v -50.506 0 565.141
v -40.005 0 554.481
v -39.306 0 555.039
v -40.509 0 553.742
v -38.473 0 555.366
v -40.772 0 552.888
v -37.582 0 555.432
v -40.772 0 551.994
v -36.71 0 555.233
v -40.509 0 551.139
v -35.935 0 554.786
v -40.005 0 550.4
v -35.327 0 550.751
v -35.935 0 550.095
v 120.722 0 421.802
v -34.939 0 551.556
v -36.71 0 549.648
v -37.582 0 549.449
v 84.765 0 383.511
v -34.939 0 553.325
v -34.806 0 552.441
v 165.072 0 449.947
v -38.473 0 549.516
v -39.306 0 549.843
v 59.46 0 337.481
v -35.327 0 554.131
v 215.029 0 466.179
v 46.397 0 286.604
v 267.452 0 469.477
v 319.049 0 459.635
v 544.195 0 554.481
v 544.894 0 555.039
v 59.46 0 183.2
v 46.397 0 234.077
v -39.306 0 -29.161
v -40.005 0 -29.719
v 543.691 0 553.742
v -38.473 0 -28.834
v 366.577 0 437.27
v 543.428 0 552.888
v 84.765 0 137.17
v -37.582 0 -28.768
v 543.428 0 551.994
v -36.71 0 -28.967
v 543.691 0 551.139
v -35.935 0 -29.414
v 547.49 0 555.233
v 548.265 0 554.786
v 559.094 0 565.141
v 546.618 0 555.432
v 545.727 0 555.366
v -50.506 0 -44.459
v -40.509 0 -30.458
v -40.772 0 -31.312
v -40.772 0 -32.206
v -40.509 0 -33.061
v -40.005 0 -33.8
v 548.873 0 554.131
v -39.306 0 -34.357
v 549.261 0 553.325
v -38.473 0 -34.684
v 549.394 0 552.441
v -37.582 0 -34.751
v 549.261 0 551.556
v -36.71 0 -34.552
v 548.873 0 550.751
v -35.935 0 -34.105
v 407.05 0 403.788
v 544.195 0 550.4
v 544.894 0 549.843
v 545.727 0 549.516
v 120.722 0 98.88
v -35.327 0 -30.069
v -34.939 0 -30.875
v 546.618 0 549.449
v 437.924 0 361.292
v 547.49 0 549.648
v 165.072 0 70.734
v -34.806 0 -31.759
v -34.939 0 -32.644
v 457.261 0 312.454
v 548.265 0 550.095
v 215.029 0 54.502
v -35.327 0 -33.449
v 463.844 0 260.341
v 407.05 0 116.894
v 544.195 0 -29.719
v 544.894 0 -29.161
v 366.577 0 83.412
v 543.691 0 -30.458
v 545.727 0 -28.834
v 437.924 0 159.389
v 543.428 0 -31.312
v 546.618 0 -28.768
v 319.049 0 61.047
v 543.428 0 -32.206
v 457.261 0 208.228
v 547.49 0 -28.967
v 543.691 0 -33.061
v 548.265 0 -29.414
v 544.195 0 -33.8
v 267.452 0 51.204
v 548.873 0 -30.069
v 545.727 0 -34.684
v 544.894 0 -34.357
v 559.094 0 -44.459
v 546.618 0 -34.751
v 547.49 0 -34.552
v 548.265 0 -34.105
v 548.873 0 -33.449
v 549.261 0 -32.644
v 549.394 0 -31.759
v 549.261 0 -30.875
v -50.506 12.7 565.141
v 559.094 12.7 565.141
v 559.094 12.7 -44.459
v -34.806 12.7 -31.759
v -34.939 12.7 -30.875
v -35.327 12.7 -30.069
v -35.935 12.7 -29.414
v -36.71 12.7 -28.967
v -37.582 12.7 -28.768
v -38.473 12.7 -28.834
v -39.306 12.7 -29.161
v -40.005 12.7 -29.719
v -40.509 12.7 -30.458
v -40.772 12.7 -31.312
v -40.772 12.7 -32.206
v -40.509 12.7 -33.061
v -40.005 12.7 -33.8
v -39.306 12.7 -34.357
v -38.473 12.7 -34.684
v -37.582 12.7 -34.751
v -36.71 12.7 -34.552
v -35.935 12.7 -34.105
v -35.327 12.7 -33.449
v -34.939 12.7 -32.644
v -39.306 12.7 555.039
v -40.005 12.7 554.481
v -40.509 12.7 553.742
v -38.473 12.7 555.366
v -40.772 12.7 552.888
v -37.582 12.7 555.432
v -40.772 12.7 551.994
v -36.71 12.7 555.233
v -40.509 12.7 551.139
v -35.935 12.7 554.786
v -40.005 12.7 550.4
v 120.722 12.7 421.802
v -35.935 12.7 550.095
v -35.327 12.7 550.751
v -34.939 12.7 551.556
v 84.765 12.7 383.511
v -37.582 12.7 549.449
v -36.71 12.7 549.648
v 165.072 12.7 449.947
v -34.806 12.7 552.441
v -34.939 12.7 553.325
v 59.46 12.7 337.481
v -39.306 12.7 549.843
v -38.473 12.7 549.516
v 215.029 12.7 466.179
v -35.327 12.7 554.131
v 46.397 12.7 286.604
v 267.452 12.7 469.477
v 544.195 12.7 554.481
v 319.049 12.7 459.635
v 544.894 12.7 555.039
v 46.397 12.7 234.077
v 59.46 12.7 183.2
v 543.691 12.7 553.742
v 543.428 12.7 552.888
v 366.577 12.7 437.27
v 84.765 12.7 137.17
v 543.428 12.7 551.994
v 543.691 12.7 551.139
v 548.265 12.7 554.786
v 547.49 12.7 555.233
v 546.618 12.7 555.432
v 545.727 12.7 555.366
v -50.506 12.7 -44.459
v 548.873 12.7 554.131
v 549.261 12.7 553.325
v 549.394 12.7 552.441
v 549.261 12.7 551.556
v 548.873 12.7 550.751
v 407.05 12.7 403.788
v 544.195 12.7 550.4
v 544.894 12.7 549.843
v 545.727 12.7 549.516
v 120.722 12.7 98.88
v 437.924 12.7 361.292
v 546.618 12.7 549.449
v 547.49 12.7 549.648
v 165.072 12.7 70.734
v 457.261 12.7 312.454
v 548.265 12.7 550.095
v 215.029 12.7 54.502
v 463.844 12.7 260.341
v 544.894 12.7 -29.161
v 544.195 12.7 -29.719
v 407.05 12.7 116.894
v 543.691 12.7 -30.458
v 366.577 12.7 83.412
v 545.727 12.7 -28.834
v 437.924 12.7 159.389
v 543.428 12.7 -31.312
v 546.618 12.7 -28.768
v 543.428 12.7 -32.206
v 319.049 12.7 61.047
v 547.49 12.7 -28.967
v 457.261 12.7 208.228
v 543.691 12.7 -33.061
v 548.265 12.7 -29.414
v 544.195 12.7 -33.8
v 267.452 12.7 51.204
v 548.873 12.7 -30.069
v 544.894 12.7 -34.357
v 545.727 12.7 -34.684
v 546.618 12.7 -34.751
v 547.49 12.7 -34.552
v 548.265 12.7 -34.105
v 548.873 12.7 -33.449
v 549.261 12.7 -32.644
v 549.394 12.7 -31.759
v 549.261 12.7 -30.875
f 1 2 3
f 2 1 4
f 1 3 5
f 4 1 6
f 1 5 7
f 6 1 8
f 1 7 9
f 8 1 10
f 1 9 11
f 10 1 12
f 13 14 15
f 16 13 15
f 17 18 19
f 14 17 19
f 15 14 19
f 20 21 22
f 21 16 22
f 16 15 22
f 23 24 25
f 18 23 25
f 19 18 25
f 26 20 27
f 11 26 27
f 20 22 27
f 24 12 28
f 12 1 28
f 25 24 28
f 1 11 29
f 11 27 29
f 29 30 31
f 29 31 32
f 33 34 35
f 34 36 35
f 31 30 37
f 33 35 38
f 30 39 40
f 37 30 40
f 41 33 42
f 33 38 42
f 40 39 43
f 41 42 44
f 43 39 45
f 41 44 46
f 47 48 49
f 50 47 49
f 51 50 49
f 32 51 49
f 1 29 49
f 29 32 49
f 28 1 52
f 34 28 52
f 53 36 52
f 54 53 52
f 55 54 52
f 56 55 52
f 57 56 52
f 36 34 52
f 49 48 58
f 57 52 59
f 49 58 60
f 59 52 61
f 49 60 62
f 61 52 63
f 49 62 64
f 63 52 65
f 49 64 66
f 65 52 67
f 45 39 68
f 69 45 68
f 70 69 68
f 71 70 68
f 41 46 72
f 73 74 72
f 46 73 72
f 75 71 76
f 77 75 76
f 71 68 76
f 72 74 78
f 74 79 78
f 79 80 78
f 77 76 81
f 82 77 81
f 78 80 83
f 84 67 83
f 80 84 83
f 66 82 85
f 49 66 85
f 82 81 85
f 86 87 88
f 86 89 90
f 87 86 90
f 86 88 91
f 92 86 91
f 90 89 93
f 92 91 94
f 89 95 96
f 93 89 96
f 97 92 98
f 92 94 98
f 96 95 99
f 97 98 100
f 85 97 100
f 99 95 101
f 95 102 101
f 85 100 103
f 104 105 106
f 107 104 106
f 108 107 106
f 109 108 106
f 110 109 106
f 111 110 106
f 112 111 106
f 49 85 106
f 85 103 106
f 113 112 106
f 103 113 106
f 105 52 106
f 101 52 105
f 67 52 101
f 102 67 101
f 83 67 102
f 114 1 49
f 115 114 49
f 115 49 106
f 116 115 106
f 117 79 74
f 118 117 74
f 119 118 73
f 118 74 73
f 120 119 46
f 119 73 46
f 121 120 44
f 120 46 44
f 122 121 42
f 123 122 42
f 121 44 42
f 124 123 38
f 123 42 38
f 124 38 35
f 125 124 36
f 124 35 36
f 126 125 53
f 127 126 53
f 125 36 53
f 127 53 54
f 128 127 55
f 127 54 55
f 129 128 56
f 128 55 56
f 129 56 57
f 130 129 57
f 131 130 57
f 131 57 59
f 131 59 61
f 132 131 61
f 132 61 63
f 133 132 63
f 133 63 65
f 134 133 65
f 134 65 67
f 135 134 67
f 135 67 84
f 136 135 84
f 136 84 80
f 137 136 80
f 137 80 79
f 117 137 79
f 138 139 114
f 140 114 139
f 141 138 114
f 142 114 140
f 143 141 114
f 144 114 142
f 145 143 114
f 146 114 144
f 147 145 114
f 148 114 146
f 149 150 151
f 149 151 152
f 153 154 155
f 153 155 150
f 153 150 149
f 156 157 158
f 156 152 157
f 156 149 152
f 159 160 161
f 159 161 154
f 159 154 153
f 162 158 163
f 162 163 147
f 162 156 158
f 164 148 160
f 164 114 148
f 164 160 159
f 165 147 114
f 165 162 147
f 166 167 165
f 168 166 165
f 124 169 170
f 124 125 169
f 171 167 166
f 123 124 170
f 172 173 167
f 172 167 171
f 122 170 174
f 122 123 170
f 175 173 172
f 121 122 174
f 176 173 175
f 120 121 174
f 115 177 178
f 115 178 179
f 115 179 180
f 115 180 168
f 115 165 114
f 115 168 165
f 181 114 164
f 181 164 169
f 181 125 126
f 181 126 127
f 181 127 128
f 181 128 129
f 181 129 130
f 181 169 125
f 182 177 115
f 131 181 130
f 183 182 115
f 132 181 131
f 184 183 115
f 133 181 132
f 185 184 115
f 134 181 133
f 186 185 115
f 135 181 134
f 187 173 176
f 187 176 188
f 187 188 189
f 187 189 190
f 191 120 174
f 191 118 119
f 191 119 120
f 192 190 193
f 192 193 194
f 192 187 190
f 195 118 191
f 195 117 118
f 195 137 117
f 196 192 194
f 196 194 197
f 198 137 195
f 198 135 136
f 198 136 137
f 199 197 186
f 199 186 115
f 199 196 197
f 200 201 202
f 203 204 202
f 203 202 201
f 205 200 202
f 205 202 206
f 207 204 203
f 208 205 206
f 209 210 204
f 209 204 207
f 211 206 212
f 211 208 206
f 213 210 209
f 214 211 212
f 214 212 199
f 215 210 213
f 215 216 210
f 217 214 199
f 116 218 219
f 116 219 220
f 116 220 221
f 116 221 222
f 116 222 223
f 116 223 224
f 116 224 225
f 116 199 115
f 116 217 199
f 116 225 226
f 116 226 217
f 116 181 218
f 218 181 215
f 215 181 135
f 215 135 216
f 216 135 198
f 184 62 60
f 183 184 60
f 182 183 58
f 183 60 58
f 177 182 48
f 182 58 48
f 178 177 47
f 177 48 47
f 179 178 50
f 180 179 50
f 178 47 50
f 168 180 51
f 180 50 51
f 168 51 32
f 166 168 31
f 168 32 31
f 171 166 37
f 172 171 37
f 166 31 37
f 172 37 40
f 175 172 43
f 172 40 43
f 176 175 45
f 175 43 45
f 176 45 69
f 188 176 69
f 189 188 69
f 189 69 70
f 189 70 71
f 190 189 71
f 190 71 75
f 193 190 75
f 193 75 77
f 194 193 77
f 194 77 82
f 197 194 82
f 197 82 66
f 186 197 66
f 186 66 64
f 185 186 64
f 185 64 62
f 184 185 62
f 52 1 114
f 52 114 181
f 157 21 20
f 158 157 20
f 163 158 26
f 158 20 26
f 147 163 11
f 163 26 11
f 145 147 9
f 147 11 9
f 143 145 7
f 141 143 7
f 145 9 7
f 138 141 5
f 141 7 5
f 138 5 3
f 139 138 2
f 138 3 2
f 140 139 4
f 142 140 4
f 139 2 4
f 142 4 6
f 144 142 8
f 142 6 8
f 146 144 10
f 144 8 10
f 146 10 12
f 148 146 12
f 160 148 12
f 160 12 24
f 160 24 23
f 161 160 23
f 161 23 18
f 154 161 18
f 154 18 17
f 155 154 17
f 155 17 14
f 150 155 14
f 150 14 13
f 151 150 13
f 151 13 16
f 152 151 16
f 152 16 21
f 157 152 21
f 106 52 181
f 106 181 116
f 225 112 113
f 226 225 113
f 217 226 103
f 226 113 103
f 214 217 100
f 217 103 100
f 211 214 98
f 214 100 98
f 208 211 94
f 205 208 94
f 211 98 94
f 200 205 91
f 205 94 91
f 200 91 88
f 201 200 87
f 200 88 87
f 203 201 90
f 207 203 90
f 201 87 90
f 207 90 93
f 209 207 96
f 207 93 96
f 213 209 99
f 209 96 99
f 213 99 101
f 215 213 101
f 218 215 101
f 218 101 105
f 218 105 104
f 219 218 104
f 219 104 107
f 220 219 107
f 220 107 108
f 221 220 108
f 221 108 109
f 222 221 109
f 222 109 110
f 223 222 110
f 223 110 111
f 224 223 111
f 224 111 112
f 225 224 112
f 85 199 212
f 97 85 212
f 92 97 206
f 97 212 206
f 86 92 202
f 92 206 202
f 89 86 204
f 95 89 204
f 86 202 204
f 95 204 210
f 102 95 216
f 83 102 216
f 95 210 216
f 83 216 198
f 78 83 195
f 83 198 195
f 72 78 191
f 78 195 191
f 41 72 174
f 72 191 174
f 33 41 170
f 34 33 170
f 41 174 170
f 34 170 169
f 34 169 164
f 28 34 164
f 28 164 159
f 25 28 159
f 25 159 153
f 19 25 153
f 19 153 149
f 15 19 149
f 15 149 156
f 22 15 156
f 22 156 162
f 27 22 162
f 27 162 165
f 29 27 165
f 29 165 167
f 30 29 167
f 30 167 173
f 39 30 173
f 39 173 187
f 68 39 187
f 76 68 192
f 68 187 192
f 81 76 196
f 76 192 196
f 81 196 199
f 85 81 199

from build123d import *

# Parameters (mm, degrees)
SKETCH1_W           = 609.6
SKETCH1_H           = 609.6
BOSS_EXTRUDE1_DEPTH = 12.7
SKETCH2_R           = 209.55
CUT_EXTRUDE1_DEPTH  = 13.7
SKETCH3_R           = 3
CUT_EXTRUDE2_DEPTH  = 13.7


with BuildPart() as part:
    # Sketch1 → Boss-Extrude1 (new body)
    with BuildSketch(Plane(origin=(0, 0, 0), x_dir=(1, 0, 0), z_dir=(0, 1, 0))):
        with Locations((254.294265396, -260.340726581)):
            Rectangle(SKETCH1_W, SKETCH1_H)
    extrude(amount=BOSS_EXTRUDE1_DEPTH)

    # Sketch2 → Cut-Extrude1 (cut, through all)
    with BuildSketch(Plane(origin=(0, 12.7, 0), x_dir=(1, 0, 0), z_dir=(0, 1, 0))):
        with Locations((254.294265396, -260.340726581)):
            Circle(SKETCH2_R)
    extrude(amount=-CUT_EXTRUDE1_DEPTH, mode=Mode.SUBTRACT)

    # Sketch3 → Cut-Extrude2 (cut, through all)
    with BuildSketch(Plane.XZ):
        with Locations((-37.805734604, 552.440726581)):
            Circle(SKETCH3_R)
        with Locations((546.394265396, 552.440726581)):
            Circle(SKETCH3_R)
        with Locations((546.394265396, -31.759273419)):
            Circle(SKETCH3_R)
        with Locations((-37.805734604, -31.759273419)):
            Circle(SKETCH3_R)
    extrude(amount=-CUT_EXTRUDE2_DEPTH, mode=Mode.SUBTRACT)


solid = part.part
